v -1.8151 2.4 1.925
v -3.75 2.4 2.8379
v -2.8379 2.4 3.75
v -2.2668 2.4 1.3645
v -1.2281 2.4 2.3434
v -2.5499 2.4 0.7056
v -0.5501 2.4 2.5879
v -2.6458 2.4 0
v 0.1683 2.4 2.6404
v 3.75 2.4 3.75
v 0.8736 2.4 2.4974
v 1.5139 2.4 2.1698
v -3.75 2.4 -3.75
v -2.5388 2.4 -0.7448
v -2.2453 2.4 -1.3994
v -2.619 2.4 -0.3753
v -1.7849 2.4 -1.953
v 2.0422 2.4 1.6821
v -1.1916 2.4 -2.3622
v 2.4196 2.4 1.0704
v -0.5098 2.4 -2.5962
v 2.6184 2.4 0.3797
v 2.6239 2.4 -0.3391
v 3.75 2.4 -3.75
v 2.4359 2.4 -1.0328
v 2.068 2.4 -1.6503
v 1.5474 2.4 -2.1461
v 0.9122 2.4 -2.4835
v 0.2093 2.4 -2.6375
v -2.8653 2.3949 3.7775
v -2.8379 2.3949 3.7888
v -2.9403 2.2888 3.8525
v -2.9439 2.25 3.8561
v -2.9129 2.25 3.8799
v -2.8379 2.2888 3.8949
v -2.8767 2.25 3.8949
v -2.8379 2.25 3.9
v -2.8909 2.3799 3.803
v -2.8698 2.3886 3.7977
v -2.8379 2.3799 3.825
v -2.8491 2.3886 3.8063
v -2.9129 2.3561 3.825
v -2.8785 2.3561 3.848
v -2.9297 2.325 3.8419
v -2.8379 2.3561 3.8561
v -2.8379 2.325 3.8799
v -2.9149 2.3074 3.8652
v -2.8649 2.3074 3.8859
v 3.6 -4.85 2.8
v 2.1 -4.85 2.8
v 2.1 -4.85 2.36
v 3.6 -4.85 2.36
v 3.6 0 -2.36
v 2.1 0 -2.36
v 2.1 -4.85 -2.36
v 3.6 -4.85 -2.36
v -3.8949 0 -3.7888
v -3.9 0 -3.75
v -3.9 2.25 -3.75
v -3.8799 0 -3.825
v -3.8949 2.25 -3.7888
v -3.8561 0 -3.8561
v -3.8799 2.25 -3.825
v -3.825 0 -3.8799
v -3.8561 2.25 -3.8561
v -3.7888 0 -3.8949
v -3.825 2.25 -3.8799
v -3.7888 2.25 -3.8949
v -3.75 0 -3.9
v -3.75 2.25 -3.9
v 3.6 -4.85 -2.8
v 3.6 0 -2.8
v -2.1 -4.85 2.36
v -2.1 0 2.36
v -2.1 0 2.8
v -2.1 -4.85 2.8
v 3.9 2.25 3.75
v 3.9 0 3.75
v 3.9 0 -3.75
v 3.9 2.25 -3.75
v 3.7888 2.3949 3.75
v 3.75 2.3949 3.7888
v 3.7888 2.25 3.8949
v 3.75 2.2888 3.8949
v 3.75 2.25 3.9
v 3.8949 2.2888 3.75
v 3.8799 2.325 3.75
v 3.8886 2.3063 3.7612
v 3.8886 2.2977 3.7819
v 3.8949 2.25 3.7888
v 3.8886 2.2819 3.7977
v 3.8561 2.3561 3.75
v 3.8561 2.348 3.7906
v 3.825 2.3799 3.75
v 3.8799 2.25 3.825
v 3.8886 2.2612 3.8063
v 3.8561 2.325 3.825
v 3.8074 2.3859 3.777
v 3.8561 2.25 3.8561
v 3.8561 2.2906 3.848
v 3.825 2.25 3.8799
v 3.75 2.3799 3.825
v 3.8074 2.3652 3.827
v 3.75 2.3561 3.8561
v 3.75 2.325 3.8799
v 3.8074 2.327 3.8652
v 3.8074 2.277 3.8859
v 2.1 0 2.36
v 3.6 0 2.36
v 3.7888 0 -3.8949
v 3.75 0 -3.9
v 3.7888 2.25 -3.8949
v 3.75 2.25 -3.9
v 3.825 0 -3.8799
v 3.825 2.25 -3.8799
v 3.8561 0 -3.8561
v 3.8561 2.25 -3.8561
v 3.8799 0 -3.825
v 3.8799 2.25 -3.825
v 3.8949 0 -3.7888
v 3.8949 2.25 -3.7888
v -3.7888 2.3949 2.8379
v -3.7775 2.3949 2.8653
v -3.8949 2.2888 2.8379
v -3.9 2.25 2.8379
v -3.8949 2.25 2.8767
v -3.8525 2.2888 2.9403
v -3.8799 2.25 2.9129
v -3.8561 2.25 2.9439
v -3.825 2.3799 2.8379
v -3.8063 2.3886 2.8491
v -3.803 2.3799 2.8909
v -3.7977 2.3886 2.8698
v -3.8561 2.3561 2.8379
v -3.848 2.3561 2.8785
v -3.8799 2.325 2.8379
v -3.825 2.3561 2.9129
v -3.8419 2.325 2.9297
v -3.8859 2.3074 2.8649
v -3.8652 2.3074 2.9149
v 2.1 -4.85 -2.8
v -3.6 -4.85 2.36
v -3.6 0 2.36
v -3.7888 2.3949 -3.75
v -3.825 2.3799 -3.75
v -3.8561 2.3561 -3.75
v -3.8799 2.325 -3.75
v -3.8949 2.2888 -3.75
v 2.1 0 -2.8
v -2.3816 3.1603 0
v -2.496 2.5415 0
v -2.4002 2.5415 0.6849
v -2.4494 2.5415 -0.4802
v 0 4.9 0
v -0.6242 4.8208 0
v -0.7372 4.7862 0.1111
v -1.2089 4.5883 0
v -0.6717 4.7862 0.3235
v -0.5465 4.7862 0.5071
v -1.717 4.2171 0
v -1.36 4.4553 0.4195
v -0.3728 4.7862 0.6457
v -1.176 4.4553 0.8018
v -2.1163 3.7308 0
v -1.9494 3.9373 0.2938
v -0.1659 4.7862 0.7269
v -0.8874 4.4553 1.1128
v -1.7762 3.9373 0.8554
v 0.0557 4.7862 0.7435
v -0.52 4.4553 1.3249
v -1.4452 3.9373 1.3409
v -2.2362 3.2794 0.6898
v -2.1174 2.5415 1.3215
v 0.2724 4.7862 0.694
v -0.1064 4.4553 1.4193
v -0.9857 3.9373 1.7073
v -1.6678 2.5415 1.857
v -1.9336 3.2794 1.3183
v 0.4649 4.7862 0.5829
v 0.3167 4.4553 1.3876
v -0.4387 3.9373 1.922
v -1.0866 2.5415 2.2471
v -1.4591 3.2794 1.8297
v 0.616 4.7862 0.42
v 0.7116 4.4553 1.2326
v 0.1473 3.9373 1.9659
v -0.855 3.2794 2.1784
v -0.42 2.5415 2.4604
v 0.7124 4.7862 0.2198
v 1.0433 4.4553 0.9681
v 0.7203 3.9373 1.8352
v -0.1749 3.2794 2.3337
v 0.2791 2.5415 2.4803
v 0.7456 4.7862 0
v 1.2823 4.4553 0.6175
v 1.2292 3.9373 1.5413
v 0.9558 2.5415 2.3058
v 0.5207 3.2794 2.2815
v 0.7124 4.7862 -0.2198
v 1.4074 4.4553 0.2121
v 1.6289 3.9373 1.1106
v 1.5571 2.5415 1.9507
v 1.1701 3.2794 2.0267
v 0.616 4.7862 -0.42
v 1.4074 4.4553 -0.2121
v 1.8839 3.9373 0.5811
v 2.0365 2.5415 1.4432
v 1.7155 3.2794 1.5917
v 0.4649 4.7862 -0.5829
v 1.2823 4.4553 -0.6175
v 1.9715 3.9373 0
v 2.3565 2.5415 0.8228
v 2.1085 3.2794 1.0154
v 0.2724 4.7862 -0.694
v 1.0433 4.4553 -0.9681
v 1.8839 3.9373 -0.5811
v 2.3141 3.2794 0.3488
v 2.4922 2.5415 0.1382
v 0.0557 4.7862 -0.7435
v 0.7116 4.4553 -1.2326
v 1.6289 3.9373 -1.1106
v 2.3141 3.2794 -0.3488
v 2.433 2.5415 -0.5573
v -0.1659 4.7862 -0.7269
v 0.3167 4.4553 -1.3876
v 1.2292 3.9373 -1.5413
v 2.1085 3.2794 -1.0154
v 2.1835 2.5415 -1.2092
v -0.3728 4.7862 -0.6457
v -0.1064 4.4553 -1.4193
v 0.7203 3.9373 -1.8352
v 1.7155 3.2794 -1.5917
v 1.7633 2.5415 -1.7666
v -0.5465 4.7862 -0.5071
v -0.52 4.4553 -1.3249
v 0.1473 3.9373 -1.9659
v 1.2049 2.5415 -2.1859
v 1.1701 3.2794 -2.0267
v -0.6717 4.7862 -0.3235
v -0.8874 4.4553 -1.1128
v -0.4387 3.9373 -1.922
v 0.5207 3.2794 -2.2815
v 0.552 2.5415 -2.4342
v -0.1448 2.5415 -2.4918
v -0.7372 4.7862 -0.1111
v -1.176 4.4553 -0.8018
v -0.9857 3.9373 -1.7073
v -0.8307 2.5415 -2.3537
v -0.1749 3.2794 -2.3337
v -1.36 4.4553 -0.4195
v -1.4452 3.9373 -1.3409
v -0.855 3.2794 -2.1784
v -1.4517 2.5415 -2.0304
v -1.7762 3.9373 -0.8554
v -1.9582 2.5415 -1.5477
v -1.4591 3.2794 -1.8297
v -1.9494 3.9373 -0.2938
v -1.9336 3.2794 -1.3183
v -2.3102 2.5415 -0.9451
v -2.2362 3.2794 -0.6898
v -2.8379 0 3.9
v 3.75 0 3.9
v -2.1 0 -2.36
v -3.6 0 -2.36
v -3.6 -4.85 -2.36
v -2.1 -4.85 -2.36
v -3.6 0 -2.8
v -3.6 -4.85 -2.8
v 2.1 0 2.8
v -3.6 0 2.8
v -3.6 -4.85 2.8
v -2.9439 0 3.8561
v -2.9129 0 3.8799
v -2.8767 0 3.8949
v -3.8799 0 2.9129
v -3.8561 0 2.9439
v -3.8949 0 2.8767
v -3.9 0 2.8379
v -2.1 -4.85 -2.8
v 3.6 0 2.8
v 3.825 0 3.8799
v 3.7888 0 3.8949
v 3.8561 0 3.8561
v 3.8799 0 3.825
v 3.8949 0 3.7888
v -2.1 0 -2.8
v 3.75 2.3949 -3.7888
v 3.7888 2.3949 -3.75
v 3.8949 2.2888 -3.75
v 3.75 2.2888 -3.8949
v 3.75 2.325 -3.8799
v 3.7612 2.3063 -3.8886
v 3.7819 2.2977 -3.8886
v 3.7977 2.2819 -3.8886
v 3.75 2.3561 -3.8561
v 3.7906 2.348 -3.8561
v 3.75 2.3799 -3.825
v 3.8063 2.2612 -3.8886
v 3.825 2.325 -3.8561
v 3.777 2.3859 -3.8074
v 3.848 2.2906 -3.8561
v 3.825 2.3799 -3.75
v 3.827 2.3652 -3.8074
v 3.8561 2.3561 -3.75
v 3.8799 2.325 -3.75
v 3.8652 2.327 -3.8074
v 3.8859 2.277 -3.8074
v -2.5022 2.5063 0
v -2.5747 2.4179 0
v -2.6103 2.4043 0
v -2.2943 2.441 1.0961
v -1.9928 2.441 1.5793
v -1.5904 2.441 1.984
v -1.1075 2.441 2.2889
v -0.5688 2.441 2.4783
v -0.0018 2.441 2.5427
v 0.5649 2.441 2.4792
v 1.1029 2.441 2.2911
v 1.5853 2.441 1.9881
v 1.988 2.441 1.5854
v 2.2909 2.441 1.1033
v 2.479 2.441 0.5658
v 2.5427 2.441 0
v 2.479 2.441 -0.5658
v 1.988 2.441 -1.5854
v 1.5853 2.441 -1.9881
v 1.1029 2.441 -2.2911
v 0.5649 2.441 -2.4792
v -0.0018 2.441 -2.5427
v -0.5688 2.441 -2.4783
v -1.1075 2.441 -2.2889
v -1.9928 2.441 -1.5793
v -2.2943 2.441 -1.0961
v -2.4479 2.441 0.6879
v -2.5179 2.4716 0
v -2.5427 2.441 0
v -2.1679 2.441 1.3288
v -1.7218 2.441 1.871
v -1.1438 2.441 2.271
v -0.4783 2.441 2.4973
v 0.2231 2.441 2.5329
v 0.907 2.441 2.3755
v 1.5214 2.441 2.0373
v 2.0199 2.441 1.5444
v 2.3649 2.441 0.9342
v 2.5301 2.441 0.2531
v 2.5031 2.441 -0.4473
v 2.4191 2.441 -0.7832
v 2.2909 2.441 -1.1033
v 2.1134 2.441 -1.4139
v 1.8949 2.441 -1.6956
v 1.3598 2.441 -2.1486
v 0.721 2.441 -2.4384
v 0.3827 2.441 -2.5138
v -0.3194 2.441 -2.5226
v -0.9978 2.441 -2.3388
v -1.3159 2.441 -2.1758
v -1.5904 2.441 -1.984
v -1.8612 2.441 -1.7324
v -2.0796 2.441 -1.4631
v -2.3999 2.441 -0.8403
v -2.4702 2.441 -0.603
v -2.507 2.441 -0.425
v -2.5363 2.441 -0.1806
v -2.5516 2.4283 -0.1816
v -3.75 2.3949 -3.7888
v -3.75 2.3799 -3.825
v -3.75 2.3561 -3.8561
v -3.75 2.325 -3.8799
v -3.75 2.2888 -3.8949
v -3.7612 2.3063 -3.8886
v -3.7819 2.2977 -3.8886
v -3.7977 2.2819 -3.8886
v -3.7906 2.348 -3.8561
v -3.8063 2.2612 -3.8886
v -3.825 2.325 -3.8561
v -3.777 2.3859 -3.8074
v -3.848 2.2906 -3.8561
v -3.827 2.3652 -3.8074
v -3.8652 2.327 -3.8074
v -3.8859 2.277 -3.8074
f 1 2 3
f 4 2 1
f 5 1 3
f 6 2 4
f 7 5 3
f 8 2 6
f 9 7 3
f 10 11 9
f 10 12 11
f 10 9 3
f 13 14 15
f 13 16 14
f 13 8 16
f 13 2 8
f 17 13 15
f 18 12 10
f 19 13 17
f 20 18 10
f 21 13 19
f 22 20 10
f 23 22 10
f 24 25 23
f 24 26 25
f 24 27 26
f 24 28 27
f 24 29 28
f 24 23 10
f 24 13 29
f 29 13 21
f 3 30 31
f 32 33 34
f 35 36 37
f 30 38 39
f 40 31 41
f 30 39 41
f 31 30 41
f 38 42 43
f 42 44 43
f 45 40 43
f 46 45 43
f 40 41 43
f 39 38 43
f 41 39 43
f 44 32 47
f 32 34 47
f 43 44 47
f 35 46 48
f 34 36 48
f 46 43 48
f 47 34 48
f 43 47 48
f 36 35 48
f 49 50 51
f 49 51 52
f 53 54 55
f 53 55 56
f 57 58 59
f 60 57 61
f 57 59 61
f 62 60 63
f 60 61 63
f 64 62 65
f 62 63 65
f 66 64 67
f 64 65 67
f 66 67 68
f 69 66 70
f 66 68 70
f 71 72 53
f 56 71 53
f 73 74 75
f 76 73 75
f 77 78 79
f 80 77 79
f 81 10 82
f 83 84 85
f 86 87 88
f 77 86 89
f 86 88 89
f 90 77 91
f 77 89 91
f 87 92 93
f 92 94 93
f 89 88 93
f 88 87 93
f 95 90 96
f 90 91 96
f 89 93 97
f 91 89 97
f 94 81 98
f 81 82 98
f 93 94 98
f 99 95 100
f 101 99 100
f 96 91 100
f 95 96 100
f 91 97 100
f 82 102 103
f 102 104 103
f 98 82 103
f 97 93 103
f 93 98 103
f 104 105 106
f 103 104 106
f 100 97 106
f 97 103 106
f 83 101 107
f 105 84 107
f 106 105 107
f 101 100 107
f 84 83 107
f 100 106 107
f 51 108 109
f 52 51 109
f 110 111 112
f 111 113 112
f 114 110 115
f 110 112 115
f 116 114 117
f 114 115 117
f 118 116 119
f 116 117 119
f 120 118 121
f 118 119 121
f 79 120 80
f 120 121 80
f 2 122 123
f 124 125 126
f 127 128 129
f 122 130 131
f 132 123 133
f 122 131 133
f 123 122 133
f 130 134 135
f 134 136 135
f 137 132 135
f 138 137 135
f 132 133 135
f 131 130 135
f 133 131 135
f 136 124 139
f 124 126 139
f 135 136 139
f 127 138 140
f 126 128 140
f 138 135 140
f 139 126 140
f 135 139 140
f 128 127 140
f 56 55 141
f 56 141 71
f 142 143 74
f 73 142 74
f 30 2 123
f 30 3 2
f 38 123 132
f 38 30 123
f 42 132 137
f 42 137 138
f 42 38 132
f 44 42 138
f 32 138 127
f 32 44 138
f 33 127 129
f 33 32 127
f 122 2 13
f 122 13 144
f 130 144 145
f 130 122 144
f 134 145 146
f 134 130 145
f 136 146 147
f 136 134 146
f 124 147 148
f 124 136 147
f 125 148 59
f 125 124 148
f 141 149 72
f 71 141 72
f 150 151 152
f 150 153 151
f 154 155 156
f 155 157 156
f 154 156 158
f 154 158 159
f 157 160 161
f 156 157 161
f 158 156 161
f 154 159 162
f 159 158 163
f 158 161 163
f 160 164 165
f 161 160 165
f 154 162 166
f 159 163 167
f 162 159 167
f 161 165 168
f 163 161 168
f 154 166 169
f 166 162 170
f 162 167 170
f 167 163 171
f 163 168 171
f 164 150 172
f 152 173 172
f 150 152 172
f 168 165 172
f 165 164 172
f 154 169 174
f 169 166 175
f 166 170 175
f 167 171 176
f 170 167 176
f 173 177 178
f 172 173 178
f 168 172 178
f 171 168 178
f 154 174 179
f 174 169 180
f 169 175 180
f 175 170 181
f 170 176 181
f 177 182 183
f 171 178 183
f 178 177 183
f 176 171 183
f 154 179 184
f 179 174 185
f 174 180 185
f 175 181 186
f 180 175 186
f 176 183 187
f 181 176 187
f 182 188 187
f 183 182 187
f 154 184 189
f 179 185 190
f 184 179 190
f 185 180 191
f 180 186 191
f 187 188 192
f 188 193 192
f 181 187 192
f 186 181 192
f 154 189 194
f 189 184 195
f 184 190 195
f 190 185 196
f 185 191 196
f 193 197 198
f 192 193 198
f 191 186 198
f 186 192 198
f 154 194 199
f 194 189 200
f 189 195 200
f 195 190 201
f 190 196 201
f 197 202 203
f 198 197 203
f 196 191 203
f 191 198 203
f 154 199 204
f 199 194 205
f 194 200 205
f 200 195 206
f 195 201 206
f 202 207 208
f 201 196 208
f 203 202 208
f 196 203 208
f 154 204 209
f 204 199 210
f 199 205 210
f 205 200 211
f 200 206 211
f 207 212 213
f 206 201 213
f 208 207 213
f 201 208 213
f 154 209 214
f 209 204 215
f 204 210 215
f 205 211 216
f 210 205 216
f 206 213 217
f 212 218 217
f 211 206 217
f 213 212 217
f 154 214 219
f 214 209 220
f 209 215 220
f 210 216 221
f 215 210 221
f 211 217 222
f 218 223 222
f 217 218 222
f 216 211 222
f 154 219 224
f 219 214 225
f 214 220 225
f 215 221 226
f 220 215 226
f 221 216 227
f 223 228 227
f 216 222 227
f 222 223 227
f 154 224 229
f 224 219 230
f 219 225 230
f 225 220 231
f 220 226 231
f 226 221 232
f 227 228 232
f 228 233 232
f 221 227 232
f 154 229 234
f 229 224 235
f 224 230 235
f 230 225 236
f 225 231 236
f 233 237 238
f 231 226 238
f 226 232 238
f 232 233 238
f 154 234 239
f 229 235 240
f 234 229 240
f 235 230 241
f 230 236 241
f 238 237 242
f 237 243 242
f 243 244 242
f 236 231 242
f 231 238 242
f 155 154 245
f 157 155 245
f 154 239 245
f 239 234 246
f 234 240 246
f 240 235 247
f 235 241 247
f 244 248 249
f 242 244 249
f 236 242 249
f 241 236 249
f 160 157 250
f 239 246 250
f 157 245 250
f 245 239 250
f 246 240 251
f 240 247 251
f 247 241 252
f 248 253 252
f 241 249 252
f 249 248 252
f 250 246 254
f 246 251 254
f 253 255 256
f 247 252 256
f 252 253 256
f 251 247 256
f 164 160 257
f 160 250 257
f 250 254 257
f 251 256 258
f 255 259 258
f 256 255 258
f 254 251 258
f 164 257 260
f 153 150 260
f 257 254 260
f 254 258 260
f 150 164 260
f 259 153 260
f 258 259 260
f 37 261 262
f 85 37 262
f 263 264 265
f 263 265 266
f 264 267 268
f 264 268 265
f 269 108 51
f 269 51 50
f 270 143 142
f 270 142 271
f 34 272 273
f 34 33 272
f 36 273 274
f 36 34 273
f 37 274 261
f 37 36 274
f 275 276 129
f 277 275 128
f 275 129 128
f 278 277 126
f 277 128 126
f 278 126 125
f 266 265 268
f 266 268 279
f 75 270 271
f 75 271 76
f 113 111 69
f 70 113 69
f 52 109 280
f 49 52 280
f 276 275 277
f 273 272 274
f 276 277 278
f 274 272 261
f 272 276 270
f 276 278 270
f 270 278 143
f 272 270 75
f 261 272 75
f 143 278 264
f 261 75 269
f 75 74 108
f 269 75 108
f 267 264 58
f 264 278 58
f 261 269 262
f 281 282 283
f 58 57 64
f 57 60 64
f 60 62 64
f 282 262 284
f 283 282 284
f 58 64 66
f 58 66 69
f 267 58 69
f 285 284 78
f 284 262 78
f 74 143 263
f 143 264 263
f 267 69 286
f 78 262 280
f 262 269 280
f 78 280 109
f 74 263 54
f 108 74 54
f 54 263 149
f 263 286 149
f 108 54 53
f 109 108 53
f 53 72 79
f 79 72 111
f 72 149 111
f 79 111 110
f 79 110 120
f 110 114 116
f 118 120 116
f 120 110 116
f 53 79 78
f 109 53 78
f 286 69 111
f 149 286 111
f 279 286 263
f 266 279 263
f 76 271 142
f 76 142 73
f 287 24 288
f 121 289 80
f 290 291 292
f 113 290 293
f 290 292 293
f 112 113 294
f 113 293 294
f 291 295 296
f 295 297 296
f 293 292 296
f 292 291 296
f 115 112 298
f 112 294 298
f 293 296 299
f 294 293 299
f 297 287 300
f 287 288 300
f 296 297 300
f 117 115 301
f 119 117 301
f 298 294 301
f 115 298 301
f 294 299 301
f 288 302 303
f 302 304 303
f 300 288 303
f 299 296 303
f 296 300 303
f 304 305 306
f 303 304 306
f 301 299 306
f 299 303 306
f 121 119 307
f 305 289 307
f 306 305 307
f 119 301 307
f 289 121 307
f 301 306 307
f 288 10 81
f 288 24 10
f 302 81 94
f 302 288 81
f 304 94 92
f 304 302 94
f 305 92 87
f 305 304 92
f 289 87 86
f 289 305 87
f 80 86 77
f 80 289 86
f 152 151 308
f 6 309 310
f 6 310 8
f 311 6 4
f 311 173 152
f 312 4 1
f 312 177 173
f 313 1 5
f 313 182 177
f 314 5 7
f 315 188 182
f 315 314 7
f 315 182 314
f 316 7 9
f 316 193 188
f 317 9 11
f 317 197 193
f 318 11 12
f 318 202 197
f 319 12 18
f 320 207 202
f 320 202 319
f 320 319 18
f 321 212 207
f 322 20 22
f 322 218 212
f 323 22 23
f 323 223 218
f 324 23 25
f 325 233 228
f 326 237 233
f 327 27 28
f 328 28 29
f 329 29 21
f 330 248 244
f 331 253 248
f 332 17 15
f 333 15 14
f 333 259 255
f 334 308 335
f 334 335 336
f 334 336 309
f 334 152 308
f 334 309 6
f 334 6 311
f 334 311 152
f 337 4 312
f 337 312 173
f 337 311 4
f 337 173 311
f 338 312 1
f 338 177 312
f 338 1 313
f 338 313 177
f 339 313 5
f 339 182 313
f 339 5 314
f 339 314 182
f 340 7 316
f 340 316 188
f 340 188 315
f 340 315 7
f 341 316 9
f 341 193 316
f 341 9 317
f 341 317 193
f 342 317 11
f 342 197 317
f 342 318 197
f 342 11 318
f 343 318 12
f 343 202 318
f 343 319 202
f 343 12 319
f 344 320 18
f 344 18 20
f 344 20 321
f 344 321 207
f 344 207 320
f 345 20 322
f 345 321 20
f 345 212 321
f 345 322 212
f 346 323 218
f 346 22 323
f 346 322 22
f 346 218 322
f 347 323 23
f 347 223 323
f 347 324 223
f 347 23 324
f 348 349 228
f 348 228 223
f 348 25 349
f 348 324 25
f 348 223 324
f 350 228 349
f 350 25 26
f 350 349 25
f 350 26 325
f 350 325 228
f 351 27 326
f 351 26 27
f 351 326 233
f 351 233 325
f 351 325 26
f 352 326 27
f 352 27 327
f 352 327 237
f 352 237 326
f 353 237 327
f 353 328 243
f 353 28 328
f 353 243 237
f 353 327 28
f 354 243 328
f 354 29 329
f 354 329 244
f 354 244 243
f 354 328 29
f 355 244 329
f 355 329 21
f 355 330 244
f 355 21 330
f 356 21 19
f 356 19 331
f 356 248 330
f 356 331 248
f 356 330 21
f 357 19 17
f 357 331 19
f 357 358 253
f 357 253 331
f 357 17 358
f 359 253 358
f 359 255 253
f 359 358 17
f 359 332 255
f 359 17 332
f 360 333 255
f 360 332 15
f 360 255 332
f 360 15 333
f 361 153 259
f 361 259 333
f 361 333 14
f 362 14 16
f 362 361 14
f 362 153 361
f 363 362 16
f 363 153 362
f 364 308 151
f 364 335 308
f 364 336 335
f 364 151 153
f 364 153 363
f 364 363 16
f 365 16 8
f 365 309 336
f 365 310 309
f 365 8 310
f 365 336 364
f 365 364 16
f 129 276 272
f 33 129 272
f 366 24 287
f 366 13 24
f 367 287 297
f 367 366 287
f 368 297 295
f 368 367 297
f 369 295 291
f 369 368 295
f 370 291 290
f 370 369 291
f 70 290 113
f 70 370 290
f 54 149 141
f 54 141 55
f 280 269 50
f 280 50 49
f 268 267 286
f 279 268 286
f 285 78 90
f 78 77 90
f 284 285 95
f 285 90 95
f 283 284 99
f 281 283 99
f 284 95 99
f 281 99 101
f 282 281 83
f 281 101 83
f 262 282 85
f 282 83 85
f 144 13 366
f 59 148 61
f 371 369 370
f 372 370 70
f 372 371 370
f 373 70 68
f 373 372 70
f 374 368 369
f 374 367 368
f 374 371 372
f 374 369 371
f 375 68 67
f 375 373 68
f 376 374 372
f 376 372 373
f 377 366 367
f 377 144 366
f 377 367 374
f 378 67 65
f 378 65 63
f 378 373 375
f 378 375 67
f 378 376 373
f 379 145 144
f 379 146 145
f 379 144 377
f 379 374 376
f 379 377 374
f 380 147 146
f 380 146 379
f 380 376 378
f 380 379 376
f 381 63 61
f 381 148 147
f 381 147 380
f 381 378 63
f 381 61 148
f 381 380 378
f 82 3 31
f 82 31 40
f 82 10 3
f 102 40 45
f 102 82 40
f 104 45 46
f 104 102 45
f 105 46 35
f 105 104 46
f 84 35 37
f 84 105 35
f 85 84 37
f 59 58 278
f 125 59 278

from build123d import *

# Parameters (mm, degrees)
EXTRUDE1_DEPTH = 2.4
FILLET1_R      = 0.15
SKETCH3_W      = 1.5
SKETCH3_H      = 0.44
EXTRUDE2_DEPTH = 4.85


with BuildPart() as part:
    # Sketch1 → Extrude1 (new body)
    with BuildSketch(Plane(origin=(0, 0, 0), x_dir=(1, 0, 0), z_dir=(0, 1, 0))):
        Polygon((-2.9, -3.9), (3.9, -3.9), (3.9, 3.9), (-3.9, 3.9), (-3.9, -2.9), align=None)
    extrude(amount=EXTRUDE1_DEPTH)

    # Sketch2 → Revolve1 (revolve)
    with BuildSketch(Plane.XY):
        with BuildLine():
            ThreePointArc((0, 4.9), (-1.767766953, 4.167766953), (-2.5, 2.4))
            Line((-2.5, 2.4), (0, 2.4))
            Line((0, 2.4), (0, 4.9))
        make_face()
    revolve(axis=Axis((0, 2.4, 0), (0, 1, 0)))

    # Fillet1
    fillet1_edges = [part.edges().sort_by_distance(p)[0] for p in [
        (2.5, 2.4, 0),
        (0.5, 2.4, 3.9),
        (-3.4, 2.4, 3.4),
        (-3.9, 2.4, -0.5),
        (0, 2.4, -3.9),
        (3.9, 2.4, 0),
        (-3.9, 1.2, -3.9),
        (3.9, 1.2, -3.9),
        (3.9, 1.2, 3.9),
        (-3.9, 1.2, 2.9),
        (-2.9, 1.2, 3.9),
    ]]
    fillet(fillet1_edges, radius=FILLET1_R)

    # Sketch3 → Extrude2 (add)
    with BuildSketch(Plane.XZ):
        with Locations((-2.85, 2.58)):
            Rectangle(SKETCH3_W, SKETCH3_H)
        with Locations((2.85, 2.58)):
            Rectangle(SKETCH3_W, SKETCH3_H)
        with Locations((2.85, -2.58)):
            Rectangle(SKETCH3_W, SKETCH3_H)
        with Locations((-2.85, -2.58)):
            Rectangle(SKETCH3_W, SKETCH3_H)
    extrude(amount=EXTRUDE2_DEPTH)


solid = part.part
